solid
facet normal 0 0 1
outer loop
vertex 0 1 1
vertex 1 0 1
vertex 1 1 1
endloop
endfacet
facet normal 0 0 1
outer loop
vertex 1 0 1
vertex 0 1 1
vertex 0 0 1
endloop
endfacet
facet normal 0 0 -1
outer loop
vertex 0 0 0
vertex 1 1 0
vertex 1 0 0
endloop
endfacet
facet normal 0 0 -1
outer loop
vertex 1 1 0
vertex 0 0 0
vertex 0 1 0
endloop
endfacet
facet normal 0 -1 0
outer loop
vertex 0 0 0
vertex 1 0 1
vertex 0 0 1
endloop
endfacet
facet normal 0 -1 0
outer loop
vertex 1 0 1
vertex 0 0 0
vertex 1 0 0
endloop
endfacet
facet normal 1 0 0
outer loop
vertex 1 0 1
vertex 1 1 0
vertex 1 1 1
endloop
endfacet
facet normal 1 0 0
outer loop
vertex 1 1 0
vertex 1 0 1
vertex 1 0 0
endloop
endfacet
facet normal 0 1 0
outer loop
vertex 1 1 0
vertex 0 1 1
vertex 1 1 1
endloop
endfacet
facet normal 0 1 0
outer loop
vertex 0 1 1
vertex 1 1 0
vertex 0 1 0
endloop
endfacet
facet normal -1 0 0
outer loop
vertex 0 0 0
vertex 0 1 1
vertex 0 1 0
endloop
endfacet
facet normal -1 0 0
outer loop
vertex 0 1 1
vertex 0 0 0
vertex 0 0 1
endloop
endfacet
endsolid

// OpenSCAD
/*
 * OpenSCAD Workshop Examples
 * Copyright (c) 2013-2016 Anar Software LLC. < http://anars.com >
 *
 * This program is free software: you can redistribute it and/or modify it under
 * the terms of the GNU General Public License as published by the Free Software
 * Foundation, either version 3 of the License, or (at your option) any later
 * version.
 *
 * This program is distributed in the hope that it will be useful, but WITHOUT
 * ANY WARRANTY; without even the implied warranty of MERCHANTABILITY or FITNESS
 * FOR A PARTICULAR PURPOSE. See the GNU General Public License for more details.
 *
 * You should have received a copy of the GNU General Public License along with
 * this program. If not, see < http://www.gnu.org/licenses/ >
 *
 */
/*

Creates a cube with sides of that 1 unit length in the first octant.

*/

cube();
